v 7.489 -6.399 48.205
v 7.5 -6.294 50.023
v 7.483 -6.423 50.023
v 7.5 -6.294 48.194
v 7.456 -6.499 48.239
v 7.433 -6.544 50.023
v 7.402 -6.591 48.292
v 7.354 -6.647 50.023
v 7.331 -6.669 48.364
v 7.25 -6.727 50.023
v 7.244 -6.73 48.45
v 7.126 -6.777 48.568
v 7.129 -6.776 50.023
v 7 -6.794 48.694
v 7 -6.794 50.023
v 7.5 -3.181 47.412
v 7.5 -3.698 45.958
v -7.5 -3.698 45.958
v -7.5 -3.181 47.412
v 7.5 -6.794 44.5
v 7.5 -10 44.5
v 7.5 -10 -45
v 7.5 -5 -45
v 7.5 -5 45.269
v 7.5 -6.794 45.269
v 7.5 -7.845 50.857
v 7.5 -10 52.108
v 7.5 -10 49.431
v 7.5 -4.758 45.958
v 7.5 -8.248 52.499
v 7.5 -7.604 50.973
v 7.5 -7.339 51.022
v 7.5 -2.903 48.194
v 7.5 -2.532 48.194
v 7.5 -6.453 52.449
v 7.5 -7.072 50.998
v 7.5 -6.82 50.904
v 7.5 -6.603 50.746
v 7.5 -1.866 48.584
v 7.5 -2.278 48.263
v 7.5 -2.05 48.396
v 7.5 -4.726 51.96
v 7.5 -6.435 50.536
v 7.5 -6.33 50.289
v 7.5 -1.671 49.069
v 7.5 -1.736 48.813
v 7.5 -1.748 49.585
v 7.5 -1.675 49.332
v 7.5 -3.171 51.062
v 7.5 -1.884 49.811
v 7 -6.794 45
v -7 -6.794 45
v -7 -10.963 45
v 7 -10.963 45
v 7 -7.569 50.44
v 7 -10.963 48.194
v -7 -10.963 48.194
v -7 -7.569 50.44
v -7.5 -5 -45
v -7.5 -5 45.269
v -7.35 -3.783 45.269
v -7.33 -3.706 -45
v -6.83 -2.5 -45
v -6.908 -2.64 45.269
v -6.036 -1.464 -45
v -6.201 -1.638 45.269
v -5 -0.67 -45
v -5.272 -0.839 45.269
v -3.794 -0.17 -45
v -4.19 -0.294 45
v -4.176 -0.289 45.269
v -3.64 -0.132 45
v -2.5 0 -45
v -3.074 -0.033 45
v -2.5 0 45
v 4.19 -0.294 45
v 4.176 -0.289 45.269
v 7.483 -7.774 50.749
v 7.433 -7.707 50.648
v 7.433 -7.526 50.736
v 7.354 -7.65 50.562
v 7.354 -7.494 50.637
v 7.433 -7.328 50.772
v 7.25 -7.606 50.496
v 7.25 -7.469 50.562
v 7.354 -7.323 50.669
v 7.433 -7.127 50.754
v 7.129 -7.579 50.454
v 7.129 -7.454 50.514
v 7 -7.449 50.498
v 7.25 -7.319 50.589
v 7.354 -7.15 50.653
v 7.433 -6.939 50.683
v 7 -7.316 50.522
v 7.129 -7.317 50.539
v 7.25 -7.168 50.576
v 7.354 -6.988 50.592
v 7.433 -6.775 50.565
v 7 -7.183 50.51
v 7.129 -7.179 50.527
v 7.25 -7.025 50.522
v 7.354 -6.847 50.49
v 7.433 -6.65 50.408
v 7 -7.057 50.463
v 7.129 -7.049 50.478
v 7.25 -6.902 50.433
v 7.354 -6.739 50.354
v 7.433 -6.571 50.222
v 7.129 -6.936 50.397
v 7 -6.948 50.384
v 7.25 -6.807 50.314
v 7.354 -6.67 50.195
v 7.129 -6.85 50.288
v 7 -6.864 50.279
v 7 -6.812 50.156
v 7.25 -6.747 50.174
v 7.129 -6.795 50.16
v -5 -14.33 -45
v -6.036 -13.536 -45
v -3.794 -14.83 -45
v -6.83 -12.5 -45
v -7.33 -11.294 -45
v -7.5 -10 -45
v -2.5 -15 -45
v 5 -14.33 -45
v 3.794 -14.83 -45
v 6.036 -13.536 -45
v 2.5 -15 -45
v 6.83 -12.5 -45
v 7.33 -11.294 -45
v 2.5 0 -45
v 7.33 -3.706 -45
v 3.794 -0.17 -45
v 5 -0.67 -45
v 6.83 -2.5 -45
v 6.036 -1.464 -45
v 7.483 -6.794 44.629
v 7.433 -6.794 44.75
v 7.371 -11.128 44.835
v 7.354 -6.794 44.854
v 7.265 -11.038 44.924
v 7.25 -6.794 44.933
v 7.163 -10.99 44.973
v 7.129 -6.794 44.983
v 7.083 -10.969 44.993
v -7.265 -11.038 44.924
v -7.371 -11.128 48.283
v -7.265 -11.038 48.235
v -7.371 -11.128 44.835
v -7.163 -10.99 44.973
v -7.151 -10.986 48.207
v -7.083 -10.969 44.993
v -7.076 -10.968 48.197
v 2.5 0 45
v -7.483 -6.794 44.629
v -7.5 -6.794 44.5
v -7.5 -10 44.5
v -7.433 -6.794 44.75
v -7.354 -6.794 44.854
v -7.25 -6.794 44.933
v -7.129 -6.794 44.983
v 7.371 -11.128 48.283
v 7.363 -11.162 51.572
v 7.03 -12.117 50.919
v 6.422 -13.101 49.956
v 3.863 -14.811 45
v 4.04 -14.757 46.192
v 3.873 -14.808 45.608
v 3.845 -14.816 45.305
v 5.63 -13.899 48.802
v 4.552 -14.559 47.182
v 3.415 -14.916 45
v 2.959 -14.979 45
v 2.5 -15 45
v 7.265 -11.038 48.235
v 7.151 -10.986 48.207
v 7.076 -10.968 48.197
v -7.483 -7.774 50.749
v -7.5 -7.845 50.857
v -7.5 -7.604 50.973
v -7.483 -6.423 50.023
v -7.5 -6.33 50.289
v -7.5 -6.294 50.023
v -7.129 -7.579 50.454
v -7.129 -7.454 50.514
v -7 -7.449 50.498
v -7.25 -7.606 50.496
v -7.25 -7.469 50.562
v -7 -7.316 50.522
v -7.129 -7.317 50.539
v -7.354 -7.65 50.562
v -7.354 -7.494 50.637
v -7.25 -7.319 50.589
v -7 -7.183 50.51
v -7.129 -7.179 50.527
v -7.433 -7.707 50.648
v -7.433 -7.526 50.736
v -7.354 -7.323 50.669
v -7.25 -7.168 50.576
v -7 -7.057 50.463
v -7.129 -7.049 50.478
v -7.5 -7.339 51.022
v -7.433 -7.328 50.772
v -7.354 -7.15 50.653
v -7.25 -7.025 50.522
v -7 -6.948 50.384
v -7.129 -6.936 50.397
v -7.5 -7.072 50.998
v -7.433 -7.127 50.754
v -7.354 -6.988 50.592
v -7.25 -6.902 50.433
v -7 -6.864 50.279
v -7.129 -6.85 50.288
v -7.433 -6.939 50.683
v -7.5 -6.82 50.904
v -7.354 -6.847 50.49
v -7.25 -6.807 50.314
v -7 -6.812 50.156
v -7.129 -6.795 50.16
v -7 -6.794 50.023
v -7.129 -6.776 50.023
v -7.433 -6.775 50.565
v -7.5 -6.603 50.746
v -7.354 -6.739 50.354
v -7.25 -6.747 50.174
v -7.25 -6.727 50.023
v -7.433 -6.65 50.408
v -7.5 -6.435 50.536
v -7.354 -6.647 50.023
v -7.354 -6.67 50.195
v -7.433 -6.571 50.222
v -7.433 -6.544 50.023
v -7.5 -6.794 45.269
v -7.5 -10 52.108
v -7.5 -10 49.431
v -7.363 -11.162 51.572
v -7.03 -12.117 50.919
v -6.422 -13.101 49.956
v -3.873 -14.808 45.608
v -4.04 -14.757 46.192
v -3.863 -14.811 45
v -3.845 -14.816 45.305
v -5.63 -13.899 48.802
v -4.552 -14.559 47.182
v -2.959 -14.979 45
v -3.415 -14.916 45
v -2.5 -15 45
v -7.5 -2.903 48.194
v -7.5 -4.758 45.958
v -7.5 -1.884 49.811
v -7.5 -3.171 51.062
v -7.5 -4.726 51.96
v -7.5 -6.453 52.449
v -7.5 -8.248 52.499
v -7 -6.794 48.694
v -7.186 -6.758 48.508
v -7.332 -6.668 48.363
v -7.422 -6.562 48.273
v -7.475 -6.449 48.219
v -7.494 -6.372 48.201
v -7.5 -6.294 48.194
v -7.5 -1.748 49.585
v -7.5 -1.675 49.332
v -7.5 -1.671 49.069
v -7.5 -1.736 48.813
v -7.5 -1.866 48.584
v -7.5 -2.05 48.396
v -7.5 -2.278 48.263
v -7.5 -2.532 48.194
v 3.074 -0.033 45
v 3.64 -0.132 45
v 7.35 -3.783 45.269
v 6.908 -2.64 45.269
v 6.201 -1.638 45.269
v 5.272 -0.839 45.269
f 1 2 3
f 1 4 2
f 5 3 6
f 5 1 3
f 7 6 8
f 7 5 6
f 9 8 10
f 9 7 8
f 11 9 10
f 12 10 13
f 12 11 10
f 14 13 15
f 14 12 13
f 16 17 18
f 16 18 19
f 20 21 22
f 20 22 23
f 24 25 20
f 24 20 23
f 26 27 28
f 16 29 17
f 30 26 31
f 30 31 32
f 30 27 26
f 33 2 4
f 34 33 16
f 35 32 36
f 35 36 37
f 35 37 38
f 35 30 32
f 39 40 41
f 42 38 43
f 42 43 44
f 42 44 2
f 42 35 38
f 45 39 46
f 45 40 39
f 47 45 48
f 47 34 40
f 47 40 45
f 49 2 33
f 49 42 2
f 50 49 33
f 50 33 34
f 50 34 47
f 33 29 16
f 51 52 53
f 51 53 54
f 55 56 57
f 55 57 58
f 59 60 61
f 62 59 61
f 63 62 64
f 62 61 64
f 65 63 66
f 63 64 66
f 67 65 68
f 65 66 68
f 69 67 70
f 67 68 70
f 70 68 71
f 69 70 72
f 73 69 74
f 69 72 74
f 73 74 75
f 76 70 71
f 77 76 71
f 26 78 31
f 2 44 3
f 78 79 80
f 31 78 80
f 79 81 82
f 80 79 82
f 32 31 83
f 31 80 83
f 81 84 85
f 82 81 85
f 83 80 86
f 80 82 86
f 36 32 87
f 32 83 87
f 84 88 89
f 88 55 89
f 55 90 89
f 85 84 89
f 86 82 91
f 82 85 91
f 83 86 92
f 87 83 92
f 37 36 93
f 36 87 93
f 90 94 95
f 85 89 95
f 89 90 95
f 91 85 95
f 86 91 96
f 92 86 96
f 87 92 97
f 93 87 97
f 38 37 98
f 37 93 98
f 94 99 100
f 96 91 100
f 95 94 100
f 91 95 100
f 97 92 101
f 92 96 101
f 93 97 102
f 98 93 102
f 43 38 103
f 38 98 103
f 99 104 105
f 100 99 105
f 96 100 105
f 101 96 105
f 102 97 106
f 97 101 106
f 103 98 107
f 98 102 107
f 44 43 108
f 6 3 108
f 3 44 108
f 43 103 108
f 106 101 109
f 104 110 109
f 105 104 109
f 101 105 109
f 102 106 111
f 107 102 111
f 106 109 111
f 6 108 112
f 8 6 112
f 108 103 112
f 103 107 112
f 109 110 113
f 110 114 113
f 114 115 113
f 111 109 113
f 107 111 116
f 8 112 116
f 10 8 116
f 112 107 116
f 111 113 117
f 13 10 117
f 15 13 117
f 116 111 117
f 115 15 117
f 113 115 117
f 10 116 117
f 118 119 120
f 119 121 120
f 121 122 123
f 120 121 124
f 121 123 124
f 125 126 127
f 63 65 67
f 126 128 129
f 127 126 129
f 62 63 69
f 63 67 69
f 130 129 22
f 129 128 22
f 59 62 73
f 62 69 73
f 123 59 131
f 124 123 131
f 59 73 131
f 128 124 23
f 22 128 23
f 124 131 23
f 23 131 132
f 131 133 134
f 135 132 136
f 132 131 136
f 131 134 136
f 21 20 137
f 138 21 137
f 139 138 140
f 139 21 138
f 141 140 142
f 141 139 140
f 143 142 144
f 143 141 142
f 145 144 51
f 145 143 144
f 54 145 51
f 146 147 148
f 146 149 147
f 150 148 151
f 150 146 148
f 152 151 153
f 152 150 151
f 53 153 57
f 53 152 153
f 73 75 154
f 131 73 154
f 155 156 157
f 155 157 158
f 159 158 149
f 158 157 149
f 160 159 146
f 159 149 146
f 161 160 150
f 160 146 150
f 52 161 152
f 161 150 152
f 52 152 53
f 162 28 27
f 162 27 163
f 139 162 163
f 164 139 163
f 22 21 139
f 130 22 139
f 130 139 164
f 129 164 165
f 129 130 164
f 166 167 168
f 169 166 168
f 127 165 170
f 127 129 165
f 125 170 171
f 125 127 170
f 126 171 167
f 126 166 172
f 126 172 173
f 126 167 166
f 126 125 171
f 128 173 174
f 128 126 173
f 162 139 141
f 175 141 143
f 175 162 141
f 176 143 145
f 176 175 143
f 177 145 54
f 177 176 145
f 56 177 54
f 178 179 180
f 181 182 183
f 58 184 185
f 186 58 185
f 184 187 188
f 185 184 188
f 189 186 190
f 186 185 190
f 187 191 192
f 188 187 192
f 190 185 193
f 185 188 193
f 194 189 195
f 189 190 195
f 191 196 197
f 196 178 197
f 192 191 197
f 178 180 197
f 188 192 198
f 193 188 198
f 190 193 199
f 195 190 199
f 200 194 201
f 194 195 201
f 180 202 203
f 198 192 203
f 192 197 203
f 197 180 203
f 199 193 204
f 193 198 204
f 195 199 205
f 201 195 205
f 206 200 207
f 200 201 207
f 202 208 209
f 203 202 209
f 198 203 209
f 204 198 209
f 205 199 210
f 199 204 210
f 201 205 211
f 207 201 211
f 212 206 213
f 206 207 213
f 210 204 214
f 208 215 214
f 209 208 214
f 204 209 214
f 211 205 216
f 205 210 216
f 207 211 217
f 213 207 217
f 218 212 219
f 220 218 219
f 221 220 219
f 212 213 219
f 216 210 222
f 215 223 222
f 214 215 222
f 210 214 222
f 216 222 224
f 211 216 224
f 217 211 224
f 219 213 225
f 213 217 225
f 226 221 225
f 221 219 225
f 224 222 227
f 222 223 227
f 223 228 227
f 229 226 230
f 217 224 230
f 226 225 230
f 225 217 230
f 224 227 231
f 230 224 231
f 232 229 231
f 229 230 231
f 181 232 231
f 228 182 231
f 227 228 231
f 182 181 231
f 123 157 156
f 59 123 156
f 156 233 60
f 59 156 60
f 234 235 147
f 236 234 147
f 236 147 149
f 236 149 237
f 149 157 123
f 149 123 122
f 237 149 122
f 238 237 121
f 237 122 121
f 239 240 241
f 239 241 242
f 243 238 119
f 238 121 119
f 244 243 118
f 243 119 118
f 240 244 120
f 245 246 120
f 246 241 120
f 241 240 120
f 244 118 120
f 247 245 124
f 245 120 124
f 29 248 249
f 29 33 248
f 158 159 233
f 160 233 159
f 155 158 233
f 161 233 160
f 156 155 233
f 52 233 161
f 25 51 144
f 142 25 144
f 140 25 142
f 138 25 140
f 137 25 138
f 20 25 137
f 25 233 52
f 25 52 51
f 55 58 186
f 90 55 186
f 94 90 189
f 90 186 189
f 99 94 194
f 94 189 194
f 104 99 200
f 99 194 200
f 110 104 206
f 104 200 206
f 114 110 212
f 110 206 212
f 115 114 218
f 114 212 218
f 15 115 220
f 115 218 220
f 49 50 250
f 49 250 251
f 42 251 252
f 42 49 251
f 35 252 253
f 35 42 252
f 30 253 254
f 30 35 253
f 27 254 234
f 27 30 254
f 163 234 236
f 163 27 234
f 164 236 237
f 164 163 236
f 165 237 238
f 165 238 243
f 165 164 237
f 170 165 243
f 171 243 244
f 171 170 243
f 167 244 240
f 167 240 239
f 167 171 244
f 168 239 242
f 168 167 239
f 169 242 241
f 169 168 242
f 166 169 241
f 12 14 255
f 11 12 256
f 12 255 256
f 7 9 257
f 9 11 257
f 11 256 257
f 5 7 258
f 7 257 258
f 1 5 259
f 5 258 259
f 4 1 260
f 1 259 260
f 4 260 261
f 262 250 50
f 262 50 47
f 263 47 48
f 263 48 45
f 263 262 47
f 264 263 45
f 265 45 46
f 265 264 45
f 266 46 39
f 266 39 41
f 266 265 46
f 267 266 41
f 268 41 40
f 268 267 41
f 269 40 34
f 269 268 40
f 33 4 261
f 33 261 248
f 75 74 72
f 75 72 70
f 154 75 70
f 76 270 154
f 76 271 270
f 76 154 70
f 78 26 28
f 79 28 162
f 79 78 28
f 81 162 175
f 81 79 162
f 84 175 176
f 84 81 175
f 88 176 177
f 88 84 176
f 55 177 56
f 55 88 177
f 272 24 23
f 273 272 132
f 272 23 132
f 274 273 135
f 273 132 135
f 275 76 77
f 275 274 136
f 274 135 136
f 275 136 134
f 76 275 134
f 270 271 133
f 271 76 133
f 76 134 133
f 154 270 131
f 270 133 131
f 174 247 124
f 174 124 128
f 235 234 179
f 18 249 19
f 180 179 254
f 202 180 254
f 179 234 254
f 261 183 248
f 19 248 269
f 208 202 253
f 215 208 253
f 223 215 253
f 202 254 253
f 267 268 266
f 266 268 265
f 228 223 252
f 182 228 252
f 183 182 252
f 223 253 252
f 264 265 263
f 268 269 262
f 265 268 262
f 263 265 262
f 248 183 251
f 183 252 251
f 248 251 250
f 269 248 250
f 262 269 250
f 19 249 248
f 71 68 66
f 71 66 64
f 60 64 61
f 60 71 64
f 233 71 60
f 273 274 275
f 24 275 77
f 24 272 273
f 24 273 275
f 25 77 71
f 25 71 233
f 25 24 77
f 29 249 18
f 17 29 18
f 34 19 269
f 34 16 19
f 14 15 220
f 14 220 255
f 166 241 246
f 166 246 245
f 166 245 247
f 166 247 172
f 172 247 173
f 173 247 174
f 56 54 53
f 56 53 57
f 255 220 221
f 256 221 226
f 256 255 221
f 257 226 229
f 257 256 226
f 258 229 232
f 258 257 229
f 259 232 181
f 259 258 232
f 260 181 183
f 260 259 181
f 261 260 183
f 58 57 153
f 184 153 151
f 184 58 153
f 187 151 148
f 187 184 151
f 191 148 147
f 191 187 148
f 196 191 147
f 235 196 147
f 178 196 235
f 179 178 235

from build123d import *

# Parameters (mm, degrees)
F0_W         = 15
F0_H         = 90
F1_DEPTH     = 15
F3_DEPTH     = 7.5
F4_DEPTH     = 7.5
F5_F1_R      = 0.5
F5_F2_R      = 0.5
F6_R         = 0.5
F7_T1_DEPTH  = 24.4510456068
F8_T1_DEPTH  = 115
F8_T6_DEPTH  = 115
F8_T11_DEPTH = 115


# Not quite as in the source:
# - a fillet or chamfer that OpenCascade refuses, or shapes differently, is made with other operations: its cross-section is extruded or revolved along the edge and cut away or added


with BuildPart() as f1:
    # F0 (on Front) → F1 (new body)
    with BuildSketch(Plane.XZ):
        Rectangle(F0_W, F0_H)
    extrude(amount=F1_DEPTH)

    # F2 (on Right) → F3 (join, symmetric)
    with BuildSketch(Plane.YZ):
        with BuildLine():
            Line((-2.532008104, 48.1942993341), (-0.9043752619, 48.1942993341))
            ThreePointArc((-0.9043752619, 48.1942993341), (-14.6602935003, 43.7750522985), (-0.289426955, 45.269450398))
            Line((-0.289426955, 45.269450398), (-6.7935246953, 45.269450398))
            Line((-6.7935246953, 45.269450398), (-6.7935246953, 43.9416393638))
            Line((-6.7935246953, 43.9416393638), (-10.9625607729, 43.9416393638))
            Line((-10.9625607729, 43.9416393638), (-10.9625607729, 48.1942993341))
            Line((-10.9625607729, 48.1942993341), (-6.7935246953, 50.9531982243))
            Line((-6.7935246953, 50.9531982243), (-6.7935246953, 48.1942993341))
            Line((-6.7935246953, 48.1942993341), (-2.9029950965, 48.1942993341))
            Line((-2.9029950965, 48.1942993341), (-2.532008104, 48.1942993341))
        make_face()
    extrude(amount=F3_DEPTH, both=True)

    # F2 (on Right) → F4 (join, symmetric)
    with BuildSketch(Plane.YZ):
        Polygon((-3.1812353409, 47.4117453826), (-2.9029950965, 48.1942993341), (-4.7579342499, 45.9584258497), (-3.6979690194, 45.9584258497), align=None)
        Polygon((-3.1812353409, 47.4117453826), (-2.532008104, 48.1942993341), (-2.9029950965, 48.1942993341), align=None)
    extrude(amount=F4_DEPTH, both=True)

    # F5: fillet of radius 0.5 on 7 edges, made by hand

    # F5_f1
    f5_f1_edges = [f1.edges().sort_by_distance(p)[0] for p in [
        (0, -6.7935246953, 50.9531982243),
    ]]
    fillet(f5_f1_edges, radius=F5_F1_R)

    # F5_f2
    f5_f2_edges = [f1.edges().sort_by_distance(p)[0] for p in [
        (7.5, -9.2660086927, 49.3170086521),
        (7.5, -10.9625607729, 46.597149667),
        (7.5, -8.8780427341, 45),
        (-7.5, -6.7935246953, 49.1085250933),
        (0, -6.7935246953, 48.1942993341),
        (7.5, -6.7935246953, 49.1085250933),
        (7.5, -7.0568455439, 50.4631858413),
        (-7.5, -7.0568455439, 50.4631858413),
    ]]
    fillet(f5_f2_edges, radius=F5_F2_R)

    # F6
    f6_edges = [f1.edges().sort_by_distance(p)[0] for p in [
        (-7.5, -8.878043, 45),
        (-7.5, -10.962561, 46.59715),
    ]]
    fillet(f6_edges, radius=F6_R)

    # F7: fillet of radius 1 on 1 edges, made by hand

    # F7_s2 → F7_t1 (cut)
    with BuildSketch(Plane.YZ.offset(-12.2255228034)):
        with BuildLine():
            ThreePointArc((-1.8842228199, 49.8107118079), (-1.7364138721, 48.8134688286), (-2.532008104, 48.1942993341))
            Line((-2.532008104, 48.1942993341), (-0.9043752619, 48.1942993341))
            ThreePointArc((-0.9043752619, 48.1942993341), (-1.3414912221, 49.0345169623), (-1.8842228199, 49.8107118079))
        make_face()
    extrude(amount=F7_T1_DEPTH, mode=Mode.SUBTRACT)

    # F8: fillet of radius 5 on 4 edges, made by hand

    # F8_s2 → F8_t1 (cut)
    with BuildSketch(Plane.XY.offset(-57.5)):
        with BuildLine():
            ThreePointArc((-7.5, -10), (-6.0355339059, -13.5355339059), (-2.5, -15))
            Line((-2.5, -15), (-7.5, -15))
            Line((-7.5, -15), (-7.5, -10))
        make_face()
        with BuildLine():
            ThreePointArc((7.5, -10), (6.0355339059, -13.5355339059), (2.5, -15))
            Line((2.5, -15), (7.5, -15))
            Line((7.5, -15), (7.5, -10))
        make_face()
    extrude(amount=F8_T1_DEPTH, mode=Mode.SUBTRACT)


with BuildPart() as f8_tool4:
    # F8_s5 → F8_t6 (new body)
    with BuildSketch(Plane.XY.offset(57.5)):
        with BuildLine():
            ThreePointArc((-7.5, -5), (-6.0355339059, -1.4644660941), (-2.5, 0))
            Line((-2.5, 0), (-7.5, 0))
            Line((-7.5, 0), (-7.5, -5))
        make_face()
    extrude(amount=-F8_T6_DEPTH)

    split(bisect_by=Plane.XY.offset(45.269450398), keep=Keep.BOTTOM)


with BuildPart() as f1_1:
    add(f1.part)

    # F8_t3: cut F8_tool4
    add(f8_tool4.part, mode=Mode.SUBTRACT)


with BuildPart() as f8_tool9:
    # F8_s10 → F8_t11 (new body)
    with BuildSketch(Plane.XY.offset(-57.5)):
        with BuildLine():
            ThreePointArc((7.5, -5), (6.0355339059, -1.4644660941), (2.5, 0))
            Line((2.5, 0), (7.5, 0))
            Line((7.5, 0), (7.5, -5))
        make_face()
    extrude(amount=F8_T11_DEPTH)

    split(bisect_by=Plane.XY.offset(45.269450398), keep=Keep.BOTTOM)


with BuildPart() as f1_2:
    add(f1_1.part)

    # F8_t8: cut F8_tool9
    add(f8_tool9.part, mode=Mode.SUBTRACT)


solid = f1_2.part
